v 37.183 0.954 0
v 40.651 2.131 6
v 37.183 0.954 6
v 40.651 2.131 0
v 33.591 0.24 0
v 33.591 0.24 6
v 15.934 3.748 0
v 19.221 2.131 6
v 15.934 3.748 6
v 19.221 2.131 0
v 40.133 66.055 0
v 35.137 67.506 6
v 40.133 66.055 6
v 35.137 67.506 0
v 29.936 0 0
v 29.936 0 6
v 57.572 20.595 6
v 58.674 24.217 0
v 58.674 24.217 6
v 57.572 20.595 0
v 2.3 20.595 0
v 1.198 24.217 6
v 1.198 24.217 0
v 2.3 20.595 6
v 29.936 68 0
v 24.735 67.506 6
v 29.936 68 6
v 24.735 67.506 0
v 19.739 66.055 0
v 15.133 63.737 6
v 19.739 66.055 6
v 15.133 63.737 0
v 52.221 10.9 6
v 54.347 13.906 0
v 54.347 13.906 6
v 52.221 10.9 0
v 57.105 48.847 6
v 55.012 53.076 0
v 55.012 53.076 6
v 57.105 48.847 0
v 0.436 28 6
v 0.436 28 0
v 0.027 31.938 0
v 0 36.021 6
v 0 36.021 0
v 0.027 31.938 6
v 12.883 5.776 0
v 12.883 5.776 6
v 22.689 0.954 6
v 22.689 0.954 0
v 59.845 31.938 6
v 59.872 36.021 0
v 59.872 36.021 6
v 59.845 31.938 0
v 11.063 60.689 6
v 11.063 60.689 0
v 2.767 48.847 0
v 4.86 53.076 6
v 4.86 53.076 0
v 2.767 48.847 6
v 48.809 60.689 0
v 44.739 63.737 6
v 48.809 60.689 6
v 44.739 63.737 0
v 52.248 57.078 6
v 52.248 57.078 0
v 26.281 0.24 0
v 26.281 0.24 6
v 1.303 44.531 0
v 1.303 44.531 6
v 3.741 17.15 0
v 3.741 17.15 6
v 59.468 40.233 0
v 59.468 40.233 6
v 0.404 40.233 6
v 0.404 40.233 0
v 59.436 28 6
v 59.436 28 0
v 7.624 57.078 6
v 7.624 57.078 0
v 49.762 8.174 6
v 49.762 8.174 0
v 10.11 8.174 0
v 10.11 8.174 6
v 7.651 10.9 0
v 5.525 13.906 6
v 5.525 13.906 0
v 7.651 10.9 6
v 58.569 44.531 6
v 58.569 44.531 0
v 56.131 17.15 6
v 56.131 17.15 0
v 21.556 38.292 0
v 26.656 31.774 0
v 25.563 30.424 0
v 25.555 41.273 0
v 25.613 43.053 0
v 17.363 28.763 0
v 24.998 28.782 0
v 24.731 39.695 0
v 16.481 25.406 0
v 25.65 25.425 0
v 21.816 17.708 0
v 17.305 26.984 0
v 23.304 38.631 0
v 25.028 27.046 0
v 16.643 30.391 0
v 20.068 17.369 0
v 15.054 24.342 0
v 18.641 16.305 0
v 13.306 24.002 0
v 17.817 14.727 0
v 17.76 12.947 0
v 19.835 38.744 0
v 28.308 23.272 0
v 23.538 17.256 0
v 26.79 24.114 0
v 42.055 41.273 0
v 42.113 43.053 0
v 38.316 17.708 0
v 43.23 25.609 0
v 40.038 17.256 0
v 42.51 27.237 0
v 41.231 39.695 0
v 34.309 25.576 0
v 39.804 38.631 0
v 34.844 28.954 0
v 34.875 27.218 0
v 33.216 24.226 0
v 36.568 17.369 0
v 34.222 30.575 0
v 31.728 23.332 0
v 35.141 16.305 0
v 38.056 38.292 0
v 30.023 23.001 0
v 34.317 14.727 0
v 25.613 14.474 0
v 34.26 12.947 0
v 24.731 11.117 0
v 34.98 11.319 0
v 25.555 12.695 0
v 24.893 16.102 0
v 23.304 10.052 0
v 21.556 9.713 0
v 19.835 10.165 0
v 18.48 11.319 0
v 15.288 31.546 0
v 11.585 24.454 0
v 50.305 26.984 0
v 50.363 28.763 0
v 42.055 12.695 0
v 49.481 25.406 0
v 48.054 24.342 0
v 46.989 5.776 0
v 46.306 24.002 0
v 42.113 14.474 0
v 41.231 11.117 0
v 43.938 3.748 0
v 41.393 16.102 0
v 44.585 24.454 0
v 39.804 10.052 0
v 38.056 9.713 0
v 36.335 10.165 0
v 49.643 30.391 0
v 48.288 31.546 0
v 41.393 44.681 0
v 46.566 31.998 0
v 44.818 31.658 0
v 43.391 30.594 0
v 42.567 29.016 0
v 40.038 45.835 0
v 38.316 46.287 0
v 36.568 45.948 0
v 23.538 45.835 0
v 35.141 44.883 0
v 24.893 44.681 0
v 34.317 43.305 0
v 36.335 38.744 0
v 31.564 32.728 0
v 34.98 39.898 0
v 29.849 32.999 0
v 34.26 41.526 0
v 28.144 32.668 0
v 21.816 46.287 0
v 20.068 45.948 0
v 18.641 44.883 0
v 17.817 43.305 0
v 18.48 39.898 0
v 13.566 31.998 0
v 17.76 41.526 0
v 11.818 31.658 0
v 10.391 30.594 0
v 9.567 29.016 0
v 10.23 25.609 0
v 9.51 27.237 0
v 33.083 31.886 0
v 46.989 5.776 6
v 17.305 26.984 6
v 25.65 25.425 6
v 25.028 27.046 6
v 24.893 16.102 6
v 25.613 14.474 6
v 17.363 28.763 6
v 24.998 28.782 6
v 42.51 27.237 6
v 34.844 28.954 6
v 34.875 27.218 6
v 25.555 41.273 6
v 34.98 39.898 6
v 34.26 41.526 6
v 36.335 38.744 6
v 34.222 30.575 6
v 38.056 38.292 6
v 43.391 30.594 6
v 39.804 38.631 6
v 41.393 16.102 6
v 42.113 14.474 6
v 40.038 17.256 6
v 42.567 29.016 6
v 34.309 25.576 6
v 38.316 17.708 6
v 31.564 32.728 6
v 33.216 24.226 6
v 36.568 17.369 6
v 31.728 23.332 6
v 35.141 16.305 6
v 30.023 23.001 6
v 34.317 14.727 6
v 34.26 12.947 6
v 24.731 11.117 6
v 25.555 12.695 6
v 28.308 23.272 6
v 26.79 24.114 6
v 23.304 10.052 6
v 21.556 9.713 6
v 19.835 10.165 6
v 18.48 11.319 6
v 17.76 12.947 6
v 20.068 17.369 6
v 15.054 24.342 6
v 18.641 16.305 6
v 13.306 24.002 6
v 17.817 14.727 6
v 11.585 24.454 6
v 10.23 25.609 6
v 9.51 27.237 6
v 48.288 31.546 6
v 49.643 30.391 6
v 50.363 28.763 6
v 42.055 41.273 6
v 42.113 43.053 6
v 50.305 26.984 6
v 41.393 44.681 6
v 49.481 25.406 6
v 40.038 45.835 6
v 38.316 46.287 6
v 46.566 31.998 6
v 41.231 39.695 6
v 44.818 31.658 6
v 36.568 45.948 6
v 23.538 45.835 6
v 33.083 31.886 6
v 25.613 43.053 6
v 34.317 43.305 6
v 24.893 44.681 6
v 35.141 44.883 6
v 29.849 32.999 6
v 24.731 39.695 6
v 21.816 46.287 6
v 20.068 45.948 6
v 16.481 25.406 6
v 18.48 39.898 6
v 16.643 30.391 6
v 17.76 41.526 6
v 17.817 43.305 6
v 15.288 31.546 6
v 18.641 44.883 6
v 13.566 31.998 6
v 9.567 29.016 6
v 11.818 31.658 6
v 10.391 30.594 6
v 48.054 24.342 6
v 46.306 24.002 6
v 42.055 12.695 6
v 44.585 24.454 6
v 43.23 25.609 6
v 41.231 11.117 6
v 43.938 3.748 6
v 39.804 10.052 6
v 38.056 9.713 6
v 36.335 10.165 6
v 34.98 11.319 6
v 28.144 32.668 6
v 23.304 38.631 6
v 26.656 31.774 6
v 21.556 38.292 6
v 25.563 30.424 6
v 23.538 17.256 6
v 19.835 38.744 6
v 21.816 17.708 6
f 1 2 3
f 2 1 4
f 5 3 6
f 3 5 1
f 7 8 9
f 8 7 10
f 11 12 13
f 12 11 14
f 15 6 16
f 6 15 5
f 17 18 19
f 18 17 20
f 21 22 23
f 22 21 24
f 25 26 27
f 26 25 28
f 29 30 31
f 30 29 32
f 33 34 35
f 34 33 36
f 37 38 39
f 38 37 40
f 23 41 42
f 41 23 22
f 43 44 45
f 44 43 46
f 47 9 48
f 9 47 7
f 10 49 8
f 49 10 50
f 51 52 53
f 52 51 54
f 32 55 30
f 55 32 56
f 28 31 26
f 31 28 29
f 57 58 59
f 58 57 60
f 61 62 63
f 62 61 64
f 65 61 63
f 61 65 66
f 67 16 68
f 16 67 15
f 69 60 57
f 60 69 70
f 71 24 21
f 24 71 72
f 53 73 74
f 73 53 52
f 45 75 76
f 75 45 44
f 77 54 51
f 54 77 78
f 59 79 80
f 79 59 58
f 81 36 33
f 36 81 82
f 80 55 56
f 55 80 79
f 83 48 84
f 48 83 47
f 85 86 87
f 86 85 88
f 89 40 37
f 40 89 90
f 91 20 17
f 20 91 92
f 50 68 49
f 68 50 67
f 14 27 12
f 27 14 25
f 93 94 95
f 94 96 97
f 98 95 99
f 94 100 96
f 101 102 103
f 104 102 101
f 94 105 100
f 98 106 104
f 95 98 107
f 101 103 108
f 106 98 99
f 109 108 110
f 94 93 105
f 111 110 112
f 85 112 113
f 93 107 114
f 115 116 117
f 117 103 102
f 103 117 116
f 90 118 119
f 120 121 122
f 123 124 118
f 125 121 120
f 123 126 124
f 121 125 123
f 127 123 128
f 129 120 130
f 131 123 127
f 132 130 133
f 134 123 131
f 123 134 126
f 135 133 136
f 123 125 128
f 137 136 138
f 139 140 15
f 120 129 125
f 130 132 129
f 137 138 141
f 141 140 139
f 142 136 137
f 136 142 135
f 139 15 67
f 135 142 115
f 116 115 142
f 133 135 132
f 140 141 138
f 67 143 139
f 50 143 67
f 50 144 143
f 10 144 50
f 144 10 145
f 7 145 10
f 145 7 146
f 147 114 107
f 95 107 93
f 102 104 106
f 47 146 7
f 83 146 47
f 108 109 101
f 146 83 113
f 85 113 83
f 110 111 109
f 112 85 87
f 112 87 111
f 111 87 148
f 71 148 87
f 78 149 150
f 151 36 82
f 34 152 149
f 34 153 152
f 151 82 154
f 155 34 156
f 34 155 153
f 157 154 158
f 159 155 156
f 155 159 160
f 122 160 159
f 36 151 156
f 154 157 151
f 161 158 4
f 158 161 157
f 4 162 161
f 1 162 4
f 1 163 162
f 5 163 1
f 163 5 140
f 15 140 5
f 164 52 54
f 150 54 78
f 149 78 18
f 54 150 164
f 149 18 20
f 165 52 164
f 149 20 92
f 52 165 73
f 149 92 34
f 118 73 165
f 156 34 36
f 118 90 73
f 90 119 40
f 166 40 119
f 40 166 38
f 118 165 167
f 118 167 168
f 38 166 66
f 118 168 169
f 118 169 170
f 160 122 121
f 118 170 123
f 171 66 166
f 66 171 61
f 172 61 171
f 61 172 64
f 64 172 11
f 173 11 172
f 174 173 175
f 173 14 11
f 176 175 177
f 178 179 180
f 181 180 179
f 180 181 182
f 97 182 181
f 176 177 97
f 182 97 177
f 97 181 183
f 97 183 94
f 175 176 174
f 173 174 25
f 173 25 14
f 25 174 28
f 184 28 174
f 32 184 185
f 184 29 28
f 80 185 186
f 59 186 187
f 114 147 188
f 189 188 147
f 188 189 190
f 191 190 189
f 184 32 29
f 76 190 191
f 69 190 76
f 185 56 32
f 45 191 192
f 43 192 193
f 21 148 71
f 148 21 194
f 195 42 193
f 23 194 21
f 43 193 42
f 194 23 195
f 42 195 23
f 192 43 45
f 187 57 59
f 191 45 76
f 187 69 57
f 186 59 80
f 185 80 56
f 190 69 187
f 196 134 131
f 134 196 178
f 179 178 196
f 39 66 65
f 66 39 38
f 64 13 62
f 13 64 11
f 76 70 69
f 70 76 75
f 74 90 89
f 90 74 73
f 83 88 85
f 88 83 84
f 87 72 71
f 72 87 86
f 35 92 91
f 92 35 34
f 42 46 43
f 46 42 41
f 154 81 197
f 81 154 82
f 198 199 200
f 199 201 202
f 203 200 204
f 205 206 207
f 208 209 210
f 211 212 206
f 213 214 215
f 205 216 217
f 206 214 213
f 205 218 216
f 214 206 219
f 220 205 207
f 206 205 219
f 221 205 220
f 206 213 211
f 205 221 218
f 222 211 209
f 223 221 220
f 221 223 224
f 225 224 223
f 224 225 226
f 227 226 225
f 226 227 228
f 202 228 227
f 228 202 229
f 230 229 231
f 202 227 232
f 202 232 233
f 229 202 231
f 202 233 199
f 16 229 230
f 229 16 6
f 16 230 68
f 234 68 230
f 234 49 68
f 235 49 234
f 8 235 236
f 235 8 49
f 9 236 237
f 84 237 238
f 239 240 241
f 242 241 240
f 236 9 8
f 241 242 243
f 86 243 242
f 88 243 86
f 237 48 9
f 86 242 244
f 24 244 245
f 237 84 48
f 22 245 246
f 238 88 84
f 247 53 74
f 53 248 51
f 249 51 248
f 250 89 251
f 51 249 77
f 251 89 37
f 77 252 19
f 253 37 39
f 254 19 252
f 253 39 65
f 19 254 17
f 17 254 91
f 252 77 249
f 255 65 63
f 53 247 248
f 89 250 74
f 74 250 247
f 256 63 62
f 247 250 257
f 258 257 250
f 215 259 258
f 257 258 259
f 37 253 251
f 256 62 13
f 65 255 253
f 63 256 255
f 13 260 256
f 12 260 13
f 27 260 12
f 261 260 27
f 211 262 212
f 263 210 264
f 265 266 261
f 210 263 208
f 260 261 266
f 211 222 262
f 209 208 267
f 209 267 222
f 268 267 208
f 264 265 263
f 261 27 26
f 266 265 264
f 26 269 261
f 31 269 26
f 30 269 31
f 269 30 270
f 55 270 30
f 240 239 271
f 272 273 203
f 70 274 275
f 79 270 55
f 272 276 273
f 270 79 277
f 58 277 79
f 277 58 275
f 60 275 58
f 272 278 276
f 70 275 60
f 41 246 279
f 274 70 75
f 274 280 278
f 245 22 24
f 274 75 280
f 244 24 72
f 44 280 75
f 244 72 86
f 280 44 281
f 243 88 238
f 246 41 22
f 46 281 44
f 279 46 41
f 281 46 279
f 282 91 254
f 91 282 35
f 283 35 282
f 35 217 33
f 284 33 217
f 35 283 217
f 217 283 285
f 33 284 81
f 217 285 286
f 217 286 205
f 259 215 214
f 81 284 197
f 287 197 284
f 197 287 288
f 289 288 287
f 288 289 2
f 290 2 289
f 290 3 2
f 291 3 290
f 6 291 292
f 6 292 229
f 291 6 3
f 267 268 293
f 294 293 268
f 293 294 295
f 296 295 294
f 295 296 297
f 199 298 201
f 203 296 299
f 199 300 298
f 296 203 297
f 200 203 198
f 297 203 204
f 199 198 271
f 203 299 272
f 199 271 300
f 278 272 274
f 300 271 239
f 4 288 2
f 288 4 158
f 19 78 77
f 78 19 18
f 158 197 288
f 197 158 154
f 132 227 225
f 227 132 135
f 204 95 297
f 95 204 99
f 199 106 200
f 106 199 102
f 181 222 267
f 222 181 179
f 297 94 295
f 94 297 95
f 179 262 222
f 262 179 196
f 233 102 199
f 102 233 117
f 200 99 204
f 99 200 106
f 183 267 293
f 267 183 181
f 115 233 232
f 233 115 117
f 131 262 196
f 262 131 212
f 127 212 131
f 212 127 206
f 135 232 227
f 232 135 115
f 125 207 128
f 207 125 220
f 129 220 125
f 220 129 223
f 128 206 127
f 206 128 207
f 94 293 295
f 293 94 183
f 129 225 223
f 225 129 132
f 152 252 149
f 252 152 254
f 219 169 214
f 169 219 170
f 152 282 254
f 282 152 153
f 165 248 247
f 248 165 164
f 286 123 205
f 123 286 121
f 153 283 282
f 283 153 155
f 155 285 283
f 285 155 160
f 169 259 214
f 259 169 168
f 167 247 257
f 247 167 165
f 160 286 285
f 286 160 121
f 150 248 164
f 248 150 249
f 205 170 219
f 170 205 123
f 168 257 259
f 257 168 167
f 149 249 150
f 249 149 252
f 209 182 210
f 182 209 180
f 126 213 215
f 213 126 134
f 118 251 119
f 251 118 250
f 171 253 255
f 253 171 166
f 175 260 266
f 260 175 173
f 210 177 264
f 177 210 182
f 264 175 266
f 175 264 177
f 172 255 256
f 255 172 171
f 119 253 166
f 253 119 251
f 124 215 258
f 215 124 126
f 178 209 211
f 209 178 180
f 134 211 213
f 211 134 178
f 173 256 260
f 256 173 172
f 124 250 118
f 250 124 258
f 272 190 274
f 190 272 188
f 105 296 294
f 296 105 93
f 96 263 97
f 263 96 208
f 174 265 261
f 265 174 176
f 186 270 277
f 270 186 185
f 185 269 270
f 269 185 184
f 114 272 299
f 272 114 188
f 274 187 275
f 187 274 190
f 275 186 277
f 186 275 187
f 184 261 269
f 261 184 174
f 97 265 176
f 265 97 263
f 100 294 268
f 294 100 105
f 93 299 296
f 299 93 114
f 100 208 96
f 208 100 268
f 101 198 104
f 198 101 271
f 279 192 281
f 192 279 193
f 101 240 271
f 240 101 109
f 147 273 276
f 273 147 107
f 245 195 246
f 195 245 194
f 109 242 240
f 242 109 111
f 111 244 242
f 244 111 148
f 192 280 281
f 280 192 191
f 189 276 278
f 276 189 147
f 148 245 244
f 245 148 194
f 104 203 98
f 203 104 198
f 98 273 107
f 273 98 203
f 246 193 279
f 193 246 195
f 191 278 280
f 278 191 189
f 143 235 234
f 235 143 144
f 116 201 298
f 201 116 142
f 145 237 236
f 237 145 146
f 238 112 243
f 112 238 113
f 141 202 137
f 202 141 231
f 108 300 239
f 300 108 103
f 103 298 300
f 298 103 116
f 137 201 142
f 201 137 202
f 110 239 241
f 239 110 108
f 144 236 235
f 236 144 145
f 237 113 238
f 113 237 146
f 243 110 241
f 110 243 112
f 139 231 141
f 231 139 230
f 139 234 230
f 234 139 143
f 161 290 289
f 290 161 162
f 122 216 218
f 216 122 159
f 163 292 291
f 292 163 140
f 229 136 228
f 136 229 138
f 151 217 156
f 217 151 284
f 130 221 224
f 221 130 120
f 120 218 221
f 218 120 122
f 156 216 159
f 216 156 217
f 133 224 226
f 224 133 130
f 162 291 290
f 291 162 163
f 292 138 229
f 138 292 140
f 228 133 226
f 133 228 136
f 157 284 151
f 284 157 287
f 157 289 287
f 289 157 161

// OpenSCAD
$fn = 32;

// ----------------------------------------------------------------------
// Cam plate: single_lobe cam, base R28
// ----------------------------------------------------------------------

// --- parameters (mm) ---
base_r = 28;              // base circle radius
lobe_h = 12;              // cam lobe rise
bore_r = 5;               // shaft bore radius
plate_t = 6;              // plate thickness, Z (extrusion height)
ring_r = 16.5;            // lightening ring radius
bolt_r = 4;               // lightening hole radius

profile = [[59.436, 28], [59.845, 31.938], [59.872, 36.021], [59.468, 40.233], [58.569, 44.531], [57.105, 48.847], [55.012, 53.076], [52.248, 57.078], [48.809, 60.689], [44.739, 63.737], [40.133, 66.055], [35.137, 67.506], [29.936, 68], [24.735, 67.506], [19.739, 66.055], [15.133, 63.737], [11.063, 60.689], [7.624, 57.078], [4.86, 53.076], [2.767, 48.847], [1.303, 44.531], [0.404, 40.233], [0, 36.021], [0.027, 31.938], [0.436, 28], [1.198, 24.217], [2.3, 20.595], [3.741, 17.15], [5.525, 13.906], [7.651, 10.9], [10.11, 8.174], [12.883, 5.776], [15.934, 3.748], [19.221, 2.131], [22.689, 0.954], [26.281, 0.24], [29.936, 0], [33.591, 0.24], [37.183, 0.954], [40.651, 2.131], [43.938, 3.748], [46.989, 5.776], [49.762, 8.174], [52.221, 10.9], [54.347, 13.906], [56.131, 17.15], [57.572, 20.595], [58.674, 24.217]];  // primary outline, 48 points, counter clockwise
void_1 = [[34.844, 28.954], [34.222, 30.575], [33.083, 31.886], [31.564, 32.728], [29.849, 32.999], [28.144, 32.668], [26.656, 31.774], [25.563, 30.424], [24.998, 28.782], [25.028, 27.046], [25.65, 25.425], [26.79, 24.114], [28.308, 23.272], [30.023, 23.001], [31.728, 23.332], [33.216, 24.226], [34.309, 25.576], [34.875, 27.218]];  // shaft bore, 18 points
void_2 = [[50.363, 28.763], [49.643, 30.391], [48.288, 31.546], [46.566, 31.998], [44.818, 31.658], [43.391, 30.594], [42.567, 29.016], [42.51, 27.237], [43.23, 25.609], [44.585, 24.454], [46.306, 24.002], [48.054, 24.342], [49.481, 25.406], [50.305, 26.984]];  // lightening hole 1, 14 points
void_3 = [[42.113, 43.053], [41.393, 44.681], [40.038, 45.835], [38.316, 46.287], [36.568, 45.948], [35.141, 44.883], [34.317, 43.305], [34.26, 41.526], [34.98, 39.898], [36.335, 38.744], [38.056, 38.292], [39.804, 38.631], [41.231, 39.695], [42.055, 41.273]];  // lightening hole 2, 14 points
void_4 = [[25.613, 43.053], [24.893, 44.681], [23.538, 45.835], [21.816, 46.287], [20.068, 45.948], [18.641, 44.883], [17.817, 43.305], [17.76, 41.526], [18.48, 39.898], [19.835, 38.744], [21.556, 38.292], [23.304, 38.631], [24.731, 39.695], [25.555, 41.273]];  // lightening hole 3, 14 points
void_5 = [[17.363, 28.763], [16.643, 30.391], [15.288, 31.546], [13.566, 31.998], [11.818, 31.658], [10.391, 30.594], [9.567, 29.016], [9.51, 27.237], [10.23, 25.609], [11.585, 24.454], [13.306, 24.002], [15.054, 24.342], [16.481, 25.406], [17.305, 26.984]];  // lightening hole 4, 14 points
void_6 = [[25.613, 14.474], [24.893, 16.102], [23.538, 17.256], [21.816, 17.708], [20.068, 17.369], [18.641, 16.305], [17.817, 14.727], [17.76, 12.947], [18.48, 11.319], [19.835, 10.165], [21.556, 9.713], [23.304, 10.052], [24.731, 11.117], [25.555, 12.695]];  // lightening hole 5, 14 points
void_7 = [[42.113, 14.474], [41.393, 16.102], [40.038, 17.256], [38.316, 17.708], [36.568, 17.369], [35.141, 16.305], [34.317, 14.727], [34.26, 12.947], [34.98, 11.319], [36.335, 10.165], [38.056, 9.713], [39.804, 10.052], [41.231, 11.117], [42.055, 12.695]];  // lightening hole 6, 14 points

// --- the one profile operation ---
difference() {
  linear_extrude(height = plate_t) polygon(points = profile);
  translate([0, 0, -1])
    linear_extrude(height = plate_t + 2) polygon(points = void_1);
  translate([0, 0, -1])
    linear_extrude(height = plate_t + 2) polygon(points = void_2);
  translate([0, 0, -1])
    linear_extrude(height = plate_t + 2) polygon(points = void_3);
  translate([0, 0, -1])
    linear_extrude(height = plate_t + 2) polygon(points = void_4);
  translate([0, 0, -1])
    linear_extrude(height = plate_t + 2) polygon(points = void_5);
  translate([0, 0, -1])
    linear_extrude(height = plate_t + 2) polygon(points = void_6);
  translate([0, 0, -1])
    linear_extrude(height = plate_t + 2) polygon(points = void_7);
}
